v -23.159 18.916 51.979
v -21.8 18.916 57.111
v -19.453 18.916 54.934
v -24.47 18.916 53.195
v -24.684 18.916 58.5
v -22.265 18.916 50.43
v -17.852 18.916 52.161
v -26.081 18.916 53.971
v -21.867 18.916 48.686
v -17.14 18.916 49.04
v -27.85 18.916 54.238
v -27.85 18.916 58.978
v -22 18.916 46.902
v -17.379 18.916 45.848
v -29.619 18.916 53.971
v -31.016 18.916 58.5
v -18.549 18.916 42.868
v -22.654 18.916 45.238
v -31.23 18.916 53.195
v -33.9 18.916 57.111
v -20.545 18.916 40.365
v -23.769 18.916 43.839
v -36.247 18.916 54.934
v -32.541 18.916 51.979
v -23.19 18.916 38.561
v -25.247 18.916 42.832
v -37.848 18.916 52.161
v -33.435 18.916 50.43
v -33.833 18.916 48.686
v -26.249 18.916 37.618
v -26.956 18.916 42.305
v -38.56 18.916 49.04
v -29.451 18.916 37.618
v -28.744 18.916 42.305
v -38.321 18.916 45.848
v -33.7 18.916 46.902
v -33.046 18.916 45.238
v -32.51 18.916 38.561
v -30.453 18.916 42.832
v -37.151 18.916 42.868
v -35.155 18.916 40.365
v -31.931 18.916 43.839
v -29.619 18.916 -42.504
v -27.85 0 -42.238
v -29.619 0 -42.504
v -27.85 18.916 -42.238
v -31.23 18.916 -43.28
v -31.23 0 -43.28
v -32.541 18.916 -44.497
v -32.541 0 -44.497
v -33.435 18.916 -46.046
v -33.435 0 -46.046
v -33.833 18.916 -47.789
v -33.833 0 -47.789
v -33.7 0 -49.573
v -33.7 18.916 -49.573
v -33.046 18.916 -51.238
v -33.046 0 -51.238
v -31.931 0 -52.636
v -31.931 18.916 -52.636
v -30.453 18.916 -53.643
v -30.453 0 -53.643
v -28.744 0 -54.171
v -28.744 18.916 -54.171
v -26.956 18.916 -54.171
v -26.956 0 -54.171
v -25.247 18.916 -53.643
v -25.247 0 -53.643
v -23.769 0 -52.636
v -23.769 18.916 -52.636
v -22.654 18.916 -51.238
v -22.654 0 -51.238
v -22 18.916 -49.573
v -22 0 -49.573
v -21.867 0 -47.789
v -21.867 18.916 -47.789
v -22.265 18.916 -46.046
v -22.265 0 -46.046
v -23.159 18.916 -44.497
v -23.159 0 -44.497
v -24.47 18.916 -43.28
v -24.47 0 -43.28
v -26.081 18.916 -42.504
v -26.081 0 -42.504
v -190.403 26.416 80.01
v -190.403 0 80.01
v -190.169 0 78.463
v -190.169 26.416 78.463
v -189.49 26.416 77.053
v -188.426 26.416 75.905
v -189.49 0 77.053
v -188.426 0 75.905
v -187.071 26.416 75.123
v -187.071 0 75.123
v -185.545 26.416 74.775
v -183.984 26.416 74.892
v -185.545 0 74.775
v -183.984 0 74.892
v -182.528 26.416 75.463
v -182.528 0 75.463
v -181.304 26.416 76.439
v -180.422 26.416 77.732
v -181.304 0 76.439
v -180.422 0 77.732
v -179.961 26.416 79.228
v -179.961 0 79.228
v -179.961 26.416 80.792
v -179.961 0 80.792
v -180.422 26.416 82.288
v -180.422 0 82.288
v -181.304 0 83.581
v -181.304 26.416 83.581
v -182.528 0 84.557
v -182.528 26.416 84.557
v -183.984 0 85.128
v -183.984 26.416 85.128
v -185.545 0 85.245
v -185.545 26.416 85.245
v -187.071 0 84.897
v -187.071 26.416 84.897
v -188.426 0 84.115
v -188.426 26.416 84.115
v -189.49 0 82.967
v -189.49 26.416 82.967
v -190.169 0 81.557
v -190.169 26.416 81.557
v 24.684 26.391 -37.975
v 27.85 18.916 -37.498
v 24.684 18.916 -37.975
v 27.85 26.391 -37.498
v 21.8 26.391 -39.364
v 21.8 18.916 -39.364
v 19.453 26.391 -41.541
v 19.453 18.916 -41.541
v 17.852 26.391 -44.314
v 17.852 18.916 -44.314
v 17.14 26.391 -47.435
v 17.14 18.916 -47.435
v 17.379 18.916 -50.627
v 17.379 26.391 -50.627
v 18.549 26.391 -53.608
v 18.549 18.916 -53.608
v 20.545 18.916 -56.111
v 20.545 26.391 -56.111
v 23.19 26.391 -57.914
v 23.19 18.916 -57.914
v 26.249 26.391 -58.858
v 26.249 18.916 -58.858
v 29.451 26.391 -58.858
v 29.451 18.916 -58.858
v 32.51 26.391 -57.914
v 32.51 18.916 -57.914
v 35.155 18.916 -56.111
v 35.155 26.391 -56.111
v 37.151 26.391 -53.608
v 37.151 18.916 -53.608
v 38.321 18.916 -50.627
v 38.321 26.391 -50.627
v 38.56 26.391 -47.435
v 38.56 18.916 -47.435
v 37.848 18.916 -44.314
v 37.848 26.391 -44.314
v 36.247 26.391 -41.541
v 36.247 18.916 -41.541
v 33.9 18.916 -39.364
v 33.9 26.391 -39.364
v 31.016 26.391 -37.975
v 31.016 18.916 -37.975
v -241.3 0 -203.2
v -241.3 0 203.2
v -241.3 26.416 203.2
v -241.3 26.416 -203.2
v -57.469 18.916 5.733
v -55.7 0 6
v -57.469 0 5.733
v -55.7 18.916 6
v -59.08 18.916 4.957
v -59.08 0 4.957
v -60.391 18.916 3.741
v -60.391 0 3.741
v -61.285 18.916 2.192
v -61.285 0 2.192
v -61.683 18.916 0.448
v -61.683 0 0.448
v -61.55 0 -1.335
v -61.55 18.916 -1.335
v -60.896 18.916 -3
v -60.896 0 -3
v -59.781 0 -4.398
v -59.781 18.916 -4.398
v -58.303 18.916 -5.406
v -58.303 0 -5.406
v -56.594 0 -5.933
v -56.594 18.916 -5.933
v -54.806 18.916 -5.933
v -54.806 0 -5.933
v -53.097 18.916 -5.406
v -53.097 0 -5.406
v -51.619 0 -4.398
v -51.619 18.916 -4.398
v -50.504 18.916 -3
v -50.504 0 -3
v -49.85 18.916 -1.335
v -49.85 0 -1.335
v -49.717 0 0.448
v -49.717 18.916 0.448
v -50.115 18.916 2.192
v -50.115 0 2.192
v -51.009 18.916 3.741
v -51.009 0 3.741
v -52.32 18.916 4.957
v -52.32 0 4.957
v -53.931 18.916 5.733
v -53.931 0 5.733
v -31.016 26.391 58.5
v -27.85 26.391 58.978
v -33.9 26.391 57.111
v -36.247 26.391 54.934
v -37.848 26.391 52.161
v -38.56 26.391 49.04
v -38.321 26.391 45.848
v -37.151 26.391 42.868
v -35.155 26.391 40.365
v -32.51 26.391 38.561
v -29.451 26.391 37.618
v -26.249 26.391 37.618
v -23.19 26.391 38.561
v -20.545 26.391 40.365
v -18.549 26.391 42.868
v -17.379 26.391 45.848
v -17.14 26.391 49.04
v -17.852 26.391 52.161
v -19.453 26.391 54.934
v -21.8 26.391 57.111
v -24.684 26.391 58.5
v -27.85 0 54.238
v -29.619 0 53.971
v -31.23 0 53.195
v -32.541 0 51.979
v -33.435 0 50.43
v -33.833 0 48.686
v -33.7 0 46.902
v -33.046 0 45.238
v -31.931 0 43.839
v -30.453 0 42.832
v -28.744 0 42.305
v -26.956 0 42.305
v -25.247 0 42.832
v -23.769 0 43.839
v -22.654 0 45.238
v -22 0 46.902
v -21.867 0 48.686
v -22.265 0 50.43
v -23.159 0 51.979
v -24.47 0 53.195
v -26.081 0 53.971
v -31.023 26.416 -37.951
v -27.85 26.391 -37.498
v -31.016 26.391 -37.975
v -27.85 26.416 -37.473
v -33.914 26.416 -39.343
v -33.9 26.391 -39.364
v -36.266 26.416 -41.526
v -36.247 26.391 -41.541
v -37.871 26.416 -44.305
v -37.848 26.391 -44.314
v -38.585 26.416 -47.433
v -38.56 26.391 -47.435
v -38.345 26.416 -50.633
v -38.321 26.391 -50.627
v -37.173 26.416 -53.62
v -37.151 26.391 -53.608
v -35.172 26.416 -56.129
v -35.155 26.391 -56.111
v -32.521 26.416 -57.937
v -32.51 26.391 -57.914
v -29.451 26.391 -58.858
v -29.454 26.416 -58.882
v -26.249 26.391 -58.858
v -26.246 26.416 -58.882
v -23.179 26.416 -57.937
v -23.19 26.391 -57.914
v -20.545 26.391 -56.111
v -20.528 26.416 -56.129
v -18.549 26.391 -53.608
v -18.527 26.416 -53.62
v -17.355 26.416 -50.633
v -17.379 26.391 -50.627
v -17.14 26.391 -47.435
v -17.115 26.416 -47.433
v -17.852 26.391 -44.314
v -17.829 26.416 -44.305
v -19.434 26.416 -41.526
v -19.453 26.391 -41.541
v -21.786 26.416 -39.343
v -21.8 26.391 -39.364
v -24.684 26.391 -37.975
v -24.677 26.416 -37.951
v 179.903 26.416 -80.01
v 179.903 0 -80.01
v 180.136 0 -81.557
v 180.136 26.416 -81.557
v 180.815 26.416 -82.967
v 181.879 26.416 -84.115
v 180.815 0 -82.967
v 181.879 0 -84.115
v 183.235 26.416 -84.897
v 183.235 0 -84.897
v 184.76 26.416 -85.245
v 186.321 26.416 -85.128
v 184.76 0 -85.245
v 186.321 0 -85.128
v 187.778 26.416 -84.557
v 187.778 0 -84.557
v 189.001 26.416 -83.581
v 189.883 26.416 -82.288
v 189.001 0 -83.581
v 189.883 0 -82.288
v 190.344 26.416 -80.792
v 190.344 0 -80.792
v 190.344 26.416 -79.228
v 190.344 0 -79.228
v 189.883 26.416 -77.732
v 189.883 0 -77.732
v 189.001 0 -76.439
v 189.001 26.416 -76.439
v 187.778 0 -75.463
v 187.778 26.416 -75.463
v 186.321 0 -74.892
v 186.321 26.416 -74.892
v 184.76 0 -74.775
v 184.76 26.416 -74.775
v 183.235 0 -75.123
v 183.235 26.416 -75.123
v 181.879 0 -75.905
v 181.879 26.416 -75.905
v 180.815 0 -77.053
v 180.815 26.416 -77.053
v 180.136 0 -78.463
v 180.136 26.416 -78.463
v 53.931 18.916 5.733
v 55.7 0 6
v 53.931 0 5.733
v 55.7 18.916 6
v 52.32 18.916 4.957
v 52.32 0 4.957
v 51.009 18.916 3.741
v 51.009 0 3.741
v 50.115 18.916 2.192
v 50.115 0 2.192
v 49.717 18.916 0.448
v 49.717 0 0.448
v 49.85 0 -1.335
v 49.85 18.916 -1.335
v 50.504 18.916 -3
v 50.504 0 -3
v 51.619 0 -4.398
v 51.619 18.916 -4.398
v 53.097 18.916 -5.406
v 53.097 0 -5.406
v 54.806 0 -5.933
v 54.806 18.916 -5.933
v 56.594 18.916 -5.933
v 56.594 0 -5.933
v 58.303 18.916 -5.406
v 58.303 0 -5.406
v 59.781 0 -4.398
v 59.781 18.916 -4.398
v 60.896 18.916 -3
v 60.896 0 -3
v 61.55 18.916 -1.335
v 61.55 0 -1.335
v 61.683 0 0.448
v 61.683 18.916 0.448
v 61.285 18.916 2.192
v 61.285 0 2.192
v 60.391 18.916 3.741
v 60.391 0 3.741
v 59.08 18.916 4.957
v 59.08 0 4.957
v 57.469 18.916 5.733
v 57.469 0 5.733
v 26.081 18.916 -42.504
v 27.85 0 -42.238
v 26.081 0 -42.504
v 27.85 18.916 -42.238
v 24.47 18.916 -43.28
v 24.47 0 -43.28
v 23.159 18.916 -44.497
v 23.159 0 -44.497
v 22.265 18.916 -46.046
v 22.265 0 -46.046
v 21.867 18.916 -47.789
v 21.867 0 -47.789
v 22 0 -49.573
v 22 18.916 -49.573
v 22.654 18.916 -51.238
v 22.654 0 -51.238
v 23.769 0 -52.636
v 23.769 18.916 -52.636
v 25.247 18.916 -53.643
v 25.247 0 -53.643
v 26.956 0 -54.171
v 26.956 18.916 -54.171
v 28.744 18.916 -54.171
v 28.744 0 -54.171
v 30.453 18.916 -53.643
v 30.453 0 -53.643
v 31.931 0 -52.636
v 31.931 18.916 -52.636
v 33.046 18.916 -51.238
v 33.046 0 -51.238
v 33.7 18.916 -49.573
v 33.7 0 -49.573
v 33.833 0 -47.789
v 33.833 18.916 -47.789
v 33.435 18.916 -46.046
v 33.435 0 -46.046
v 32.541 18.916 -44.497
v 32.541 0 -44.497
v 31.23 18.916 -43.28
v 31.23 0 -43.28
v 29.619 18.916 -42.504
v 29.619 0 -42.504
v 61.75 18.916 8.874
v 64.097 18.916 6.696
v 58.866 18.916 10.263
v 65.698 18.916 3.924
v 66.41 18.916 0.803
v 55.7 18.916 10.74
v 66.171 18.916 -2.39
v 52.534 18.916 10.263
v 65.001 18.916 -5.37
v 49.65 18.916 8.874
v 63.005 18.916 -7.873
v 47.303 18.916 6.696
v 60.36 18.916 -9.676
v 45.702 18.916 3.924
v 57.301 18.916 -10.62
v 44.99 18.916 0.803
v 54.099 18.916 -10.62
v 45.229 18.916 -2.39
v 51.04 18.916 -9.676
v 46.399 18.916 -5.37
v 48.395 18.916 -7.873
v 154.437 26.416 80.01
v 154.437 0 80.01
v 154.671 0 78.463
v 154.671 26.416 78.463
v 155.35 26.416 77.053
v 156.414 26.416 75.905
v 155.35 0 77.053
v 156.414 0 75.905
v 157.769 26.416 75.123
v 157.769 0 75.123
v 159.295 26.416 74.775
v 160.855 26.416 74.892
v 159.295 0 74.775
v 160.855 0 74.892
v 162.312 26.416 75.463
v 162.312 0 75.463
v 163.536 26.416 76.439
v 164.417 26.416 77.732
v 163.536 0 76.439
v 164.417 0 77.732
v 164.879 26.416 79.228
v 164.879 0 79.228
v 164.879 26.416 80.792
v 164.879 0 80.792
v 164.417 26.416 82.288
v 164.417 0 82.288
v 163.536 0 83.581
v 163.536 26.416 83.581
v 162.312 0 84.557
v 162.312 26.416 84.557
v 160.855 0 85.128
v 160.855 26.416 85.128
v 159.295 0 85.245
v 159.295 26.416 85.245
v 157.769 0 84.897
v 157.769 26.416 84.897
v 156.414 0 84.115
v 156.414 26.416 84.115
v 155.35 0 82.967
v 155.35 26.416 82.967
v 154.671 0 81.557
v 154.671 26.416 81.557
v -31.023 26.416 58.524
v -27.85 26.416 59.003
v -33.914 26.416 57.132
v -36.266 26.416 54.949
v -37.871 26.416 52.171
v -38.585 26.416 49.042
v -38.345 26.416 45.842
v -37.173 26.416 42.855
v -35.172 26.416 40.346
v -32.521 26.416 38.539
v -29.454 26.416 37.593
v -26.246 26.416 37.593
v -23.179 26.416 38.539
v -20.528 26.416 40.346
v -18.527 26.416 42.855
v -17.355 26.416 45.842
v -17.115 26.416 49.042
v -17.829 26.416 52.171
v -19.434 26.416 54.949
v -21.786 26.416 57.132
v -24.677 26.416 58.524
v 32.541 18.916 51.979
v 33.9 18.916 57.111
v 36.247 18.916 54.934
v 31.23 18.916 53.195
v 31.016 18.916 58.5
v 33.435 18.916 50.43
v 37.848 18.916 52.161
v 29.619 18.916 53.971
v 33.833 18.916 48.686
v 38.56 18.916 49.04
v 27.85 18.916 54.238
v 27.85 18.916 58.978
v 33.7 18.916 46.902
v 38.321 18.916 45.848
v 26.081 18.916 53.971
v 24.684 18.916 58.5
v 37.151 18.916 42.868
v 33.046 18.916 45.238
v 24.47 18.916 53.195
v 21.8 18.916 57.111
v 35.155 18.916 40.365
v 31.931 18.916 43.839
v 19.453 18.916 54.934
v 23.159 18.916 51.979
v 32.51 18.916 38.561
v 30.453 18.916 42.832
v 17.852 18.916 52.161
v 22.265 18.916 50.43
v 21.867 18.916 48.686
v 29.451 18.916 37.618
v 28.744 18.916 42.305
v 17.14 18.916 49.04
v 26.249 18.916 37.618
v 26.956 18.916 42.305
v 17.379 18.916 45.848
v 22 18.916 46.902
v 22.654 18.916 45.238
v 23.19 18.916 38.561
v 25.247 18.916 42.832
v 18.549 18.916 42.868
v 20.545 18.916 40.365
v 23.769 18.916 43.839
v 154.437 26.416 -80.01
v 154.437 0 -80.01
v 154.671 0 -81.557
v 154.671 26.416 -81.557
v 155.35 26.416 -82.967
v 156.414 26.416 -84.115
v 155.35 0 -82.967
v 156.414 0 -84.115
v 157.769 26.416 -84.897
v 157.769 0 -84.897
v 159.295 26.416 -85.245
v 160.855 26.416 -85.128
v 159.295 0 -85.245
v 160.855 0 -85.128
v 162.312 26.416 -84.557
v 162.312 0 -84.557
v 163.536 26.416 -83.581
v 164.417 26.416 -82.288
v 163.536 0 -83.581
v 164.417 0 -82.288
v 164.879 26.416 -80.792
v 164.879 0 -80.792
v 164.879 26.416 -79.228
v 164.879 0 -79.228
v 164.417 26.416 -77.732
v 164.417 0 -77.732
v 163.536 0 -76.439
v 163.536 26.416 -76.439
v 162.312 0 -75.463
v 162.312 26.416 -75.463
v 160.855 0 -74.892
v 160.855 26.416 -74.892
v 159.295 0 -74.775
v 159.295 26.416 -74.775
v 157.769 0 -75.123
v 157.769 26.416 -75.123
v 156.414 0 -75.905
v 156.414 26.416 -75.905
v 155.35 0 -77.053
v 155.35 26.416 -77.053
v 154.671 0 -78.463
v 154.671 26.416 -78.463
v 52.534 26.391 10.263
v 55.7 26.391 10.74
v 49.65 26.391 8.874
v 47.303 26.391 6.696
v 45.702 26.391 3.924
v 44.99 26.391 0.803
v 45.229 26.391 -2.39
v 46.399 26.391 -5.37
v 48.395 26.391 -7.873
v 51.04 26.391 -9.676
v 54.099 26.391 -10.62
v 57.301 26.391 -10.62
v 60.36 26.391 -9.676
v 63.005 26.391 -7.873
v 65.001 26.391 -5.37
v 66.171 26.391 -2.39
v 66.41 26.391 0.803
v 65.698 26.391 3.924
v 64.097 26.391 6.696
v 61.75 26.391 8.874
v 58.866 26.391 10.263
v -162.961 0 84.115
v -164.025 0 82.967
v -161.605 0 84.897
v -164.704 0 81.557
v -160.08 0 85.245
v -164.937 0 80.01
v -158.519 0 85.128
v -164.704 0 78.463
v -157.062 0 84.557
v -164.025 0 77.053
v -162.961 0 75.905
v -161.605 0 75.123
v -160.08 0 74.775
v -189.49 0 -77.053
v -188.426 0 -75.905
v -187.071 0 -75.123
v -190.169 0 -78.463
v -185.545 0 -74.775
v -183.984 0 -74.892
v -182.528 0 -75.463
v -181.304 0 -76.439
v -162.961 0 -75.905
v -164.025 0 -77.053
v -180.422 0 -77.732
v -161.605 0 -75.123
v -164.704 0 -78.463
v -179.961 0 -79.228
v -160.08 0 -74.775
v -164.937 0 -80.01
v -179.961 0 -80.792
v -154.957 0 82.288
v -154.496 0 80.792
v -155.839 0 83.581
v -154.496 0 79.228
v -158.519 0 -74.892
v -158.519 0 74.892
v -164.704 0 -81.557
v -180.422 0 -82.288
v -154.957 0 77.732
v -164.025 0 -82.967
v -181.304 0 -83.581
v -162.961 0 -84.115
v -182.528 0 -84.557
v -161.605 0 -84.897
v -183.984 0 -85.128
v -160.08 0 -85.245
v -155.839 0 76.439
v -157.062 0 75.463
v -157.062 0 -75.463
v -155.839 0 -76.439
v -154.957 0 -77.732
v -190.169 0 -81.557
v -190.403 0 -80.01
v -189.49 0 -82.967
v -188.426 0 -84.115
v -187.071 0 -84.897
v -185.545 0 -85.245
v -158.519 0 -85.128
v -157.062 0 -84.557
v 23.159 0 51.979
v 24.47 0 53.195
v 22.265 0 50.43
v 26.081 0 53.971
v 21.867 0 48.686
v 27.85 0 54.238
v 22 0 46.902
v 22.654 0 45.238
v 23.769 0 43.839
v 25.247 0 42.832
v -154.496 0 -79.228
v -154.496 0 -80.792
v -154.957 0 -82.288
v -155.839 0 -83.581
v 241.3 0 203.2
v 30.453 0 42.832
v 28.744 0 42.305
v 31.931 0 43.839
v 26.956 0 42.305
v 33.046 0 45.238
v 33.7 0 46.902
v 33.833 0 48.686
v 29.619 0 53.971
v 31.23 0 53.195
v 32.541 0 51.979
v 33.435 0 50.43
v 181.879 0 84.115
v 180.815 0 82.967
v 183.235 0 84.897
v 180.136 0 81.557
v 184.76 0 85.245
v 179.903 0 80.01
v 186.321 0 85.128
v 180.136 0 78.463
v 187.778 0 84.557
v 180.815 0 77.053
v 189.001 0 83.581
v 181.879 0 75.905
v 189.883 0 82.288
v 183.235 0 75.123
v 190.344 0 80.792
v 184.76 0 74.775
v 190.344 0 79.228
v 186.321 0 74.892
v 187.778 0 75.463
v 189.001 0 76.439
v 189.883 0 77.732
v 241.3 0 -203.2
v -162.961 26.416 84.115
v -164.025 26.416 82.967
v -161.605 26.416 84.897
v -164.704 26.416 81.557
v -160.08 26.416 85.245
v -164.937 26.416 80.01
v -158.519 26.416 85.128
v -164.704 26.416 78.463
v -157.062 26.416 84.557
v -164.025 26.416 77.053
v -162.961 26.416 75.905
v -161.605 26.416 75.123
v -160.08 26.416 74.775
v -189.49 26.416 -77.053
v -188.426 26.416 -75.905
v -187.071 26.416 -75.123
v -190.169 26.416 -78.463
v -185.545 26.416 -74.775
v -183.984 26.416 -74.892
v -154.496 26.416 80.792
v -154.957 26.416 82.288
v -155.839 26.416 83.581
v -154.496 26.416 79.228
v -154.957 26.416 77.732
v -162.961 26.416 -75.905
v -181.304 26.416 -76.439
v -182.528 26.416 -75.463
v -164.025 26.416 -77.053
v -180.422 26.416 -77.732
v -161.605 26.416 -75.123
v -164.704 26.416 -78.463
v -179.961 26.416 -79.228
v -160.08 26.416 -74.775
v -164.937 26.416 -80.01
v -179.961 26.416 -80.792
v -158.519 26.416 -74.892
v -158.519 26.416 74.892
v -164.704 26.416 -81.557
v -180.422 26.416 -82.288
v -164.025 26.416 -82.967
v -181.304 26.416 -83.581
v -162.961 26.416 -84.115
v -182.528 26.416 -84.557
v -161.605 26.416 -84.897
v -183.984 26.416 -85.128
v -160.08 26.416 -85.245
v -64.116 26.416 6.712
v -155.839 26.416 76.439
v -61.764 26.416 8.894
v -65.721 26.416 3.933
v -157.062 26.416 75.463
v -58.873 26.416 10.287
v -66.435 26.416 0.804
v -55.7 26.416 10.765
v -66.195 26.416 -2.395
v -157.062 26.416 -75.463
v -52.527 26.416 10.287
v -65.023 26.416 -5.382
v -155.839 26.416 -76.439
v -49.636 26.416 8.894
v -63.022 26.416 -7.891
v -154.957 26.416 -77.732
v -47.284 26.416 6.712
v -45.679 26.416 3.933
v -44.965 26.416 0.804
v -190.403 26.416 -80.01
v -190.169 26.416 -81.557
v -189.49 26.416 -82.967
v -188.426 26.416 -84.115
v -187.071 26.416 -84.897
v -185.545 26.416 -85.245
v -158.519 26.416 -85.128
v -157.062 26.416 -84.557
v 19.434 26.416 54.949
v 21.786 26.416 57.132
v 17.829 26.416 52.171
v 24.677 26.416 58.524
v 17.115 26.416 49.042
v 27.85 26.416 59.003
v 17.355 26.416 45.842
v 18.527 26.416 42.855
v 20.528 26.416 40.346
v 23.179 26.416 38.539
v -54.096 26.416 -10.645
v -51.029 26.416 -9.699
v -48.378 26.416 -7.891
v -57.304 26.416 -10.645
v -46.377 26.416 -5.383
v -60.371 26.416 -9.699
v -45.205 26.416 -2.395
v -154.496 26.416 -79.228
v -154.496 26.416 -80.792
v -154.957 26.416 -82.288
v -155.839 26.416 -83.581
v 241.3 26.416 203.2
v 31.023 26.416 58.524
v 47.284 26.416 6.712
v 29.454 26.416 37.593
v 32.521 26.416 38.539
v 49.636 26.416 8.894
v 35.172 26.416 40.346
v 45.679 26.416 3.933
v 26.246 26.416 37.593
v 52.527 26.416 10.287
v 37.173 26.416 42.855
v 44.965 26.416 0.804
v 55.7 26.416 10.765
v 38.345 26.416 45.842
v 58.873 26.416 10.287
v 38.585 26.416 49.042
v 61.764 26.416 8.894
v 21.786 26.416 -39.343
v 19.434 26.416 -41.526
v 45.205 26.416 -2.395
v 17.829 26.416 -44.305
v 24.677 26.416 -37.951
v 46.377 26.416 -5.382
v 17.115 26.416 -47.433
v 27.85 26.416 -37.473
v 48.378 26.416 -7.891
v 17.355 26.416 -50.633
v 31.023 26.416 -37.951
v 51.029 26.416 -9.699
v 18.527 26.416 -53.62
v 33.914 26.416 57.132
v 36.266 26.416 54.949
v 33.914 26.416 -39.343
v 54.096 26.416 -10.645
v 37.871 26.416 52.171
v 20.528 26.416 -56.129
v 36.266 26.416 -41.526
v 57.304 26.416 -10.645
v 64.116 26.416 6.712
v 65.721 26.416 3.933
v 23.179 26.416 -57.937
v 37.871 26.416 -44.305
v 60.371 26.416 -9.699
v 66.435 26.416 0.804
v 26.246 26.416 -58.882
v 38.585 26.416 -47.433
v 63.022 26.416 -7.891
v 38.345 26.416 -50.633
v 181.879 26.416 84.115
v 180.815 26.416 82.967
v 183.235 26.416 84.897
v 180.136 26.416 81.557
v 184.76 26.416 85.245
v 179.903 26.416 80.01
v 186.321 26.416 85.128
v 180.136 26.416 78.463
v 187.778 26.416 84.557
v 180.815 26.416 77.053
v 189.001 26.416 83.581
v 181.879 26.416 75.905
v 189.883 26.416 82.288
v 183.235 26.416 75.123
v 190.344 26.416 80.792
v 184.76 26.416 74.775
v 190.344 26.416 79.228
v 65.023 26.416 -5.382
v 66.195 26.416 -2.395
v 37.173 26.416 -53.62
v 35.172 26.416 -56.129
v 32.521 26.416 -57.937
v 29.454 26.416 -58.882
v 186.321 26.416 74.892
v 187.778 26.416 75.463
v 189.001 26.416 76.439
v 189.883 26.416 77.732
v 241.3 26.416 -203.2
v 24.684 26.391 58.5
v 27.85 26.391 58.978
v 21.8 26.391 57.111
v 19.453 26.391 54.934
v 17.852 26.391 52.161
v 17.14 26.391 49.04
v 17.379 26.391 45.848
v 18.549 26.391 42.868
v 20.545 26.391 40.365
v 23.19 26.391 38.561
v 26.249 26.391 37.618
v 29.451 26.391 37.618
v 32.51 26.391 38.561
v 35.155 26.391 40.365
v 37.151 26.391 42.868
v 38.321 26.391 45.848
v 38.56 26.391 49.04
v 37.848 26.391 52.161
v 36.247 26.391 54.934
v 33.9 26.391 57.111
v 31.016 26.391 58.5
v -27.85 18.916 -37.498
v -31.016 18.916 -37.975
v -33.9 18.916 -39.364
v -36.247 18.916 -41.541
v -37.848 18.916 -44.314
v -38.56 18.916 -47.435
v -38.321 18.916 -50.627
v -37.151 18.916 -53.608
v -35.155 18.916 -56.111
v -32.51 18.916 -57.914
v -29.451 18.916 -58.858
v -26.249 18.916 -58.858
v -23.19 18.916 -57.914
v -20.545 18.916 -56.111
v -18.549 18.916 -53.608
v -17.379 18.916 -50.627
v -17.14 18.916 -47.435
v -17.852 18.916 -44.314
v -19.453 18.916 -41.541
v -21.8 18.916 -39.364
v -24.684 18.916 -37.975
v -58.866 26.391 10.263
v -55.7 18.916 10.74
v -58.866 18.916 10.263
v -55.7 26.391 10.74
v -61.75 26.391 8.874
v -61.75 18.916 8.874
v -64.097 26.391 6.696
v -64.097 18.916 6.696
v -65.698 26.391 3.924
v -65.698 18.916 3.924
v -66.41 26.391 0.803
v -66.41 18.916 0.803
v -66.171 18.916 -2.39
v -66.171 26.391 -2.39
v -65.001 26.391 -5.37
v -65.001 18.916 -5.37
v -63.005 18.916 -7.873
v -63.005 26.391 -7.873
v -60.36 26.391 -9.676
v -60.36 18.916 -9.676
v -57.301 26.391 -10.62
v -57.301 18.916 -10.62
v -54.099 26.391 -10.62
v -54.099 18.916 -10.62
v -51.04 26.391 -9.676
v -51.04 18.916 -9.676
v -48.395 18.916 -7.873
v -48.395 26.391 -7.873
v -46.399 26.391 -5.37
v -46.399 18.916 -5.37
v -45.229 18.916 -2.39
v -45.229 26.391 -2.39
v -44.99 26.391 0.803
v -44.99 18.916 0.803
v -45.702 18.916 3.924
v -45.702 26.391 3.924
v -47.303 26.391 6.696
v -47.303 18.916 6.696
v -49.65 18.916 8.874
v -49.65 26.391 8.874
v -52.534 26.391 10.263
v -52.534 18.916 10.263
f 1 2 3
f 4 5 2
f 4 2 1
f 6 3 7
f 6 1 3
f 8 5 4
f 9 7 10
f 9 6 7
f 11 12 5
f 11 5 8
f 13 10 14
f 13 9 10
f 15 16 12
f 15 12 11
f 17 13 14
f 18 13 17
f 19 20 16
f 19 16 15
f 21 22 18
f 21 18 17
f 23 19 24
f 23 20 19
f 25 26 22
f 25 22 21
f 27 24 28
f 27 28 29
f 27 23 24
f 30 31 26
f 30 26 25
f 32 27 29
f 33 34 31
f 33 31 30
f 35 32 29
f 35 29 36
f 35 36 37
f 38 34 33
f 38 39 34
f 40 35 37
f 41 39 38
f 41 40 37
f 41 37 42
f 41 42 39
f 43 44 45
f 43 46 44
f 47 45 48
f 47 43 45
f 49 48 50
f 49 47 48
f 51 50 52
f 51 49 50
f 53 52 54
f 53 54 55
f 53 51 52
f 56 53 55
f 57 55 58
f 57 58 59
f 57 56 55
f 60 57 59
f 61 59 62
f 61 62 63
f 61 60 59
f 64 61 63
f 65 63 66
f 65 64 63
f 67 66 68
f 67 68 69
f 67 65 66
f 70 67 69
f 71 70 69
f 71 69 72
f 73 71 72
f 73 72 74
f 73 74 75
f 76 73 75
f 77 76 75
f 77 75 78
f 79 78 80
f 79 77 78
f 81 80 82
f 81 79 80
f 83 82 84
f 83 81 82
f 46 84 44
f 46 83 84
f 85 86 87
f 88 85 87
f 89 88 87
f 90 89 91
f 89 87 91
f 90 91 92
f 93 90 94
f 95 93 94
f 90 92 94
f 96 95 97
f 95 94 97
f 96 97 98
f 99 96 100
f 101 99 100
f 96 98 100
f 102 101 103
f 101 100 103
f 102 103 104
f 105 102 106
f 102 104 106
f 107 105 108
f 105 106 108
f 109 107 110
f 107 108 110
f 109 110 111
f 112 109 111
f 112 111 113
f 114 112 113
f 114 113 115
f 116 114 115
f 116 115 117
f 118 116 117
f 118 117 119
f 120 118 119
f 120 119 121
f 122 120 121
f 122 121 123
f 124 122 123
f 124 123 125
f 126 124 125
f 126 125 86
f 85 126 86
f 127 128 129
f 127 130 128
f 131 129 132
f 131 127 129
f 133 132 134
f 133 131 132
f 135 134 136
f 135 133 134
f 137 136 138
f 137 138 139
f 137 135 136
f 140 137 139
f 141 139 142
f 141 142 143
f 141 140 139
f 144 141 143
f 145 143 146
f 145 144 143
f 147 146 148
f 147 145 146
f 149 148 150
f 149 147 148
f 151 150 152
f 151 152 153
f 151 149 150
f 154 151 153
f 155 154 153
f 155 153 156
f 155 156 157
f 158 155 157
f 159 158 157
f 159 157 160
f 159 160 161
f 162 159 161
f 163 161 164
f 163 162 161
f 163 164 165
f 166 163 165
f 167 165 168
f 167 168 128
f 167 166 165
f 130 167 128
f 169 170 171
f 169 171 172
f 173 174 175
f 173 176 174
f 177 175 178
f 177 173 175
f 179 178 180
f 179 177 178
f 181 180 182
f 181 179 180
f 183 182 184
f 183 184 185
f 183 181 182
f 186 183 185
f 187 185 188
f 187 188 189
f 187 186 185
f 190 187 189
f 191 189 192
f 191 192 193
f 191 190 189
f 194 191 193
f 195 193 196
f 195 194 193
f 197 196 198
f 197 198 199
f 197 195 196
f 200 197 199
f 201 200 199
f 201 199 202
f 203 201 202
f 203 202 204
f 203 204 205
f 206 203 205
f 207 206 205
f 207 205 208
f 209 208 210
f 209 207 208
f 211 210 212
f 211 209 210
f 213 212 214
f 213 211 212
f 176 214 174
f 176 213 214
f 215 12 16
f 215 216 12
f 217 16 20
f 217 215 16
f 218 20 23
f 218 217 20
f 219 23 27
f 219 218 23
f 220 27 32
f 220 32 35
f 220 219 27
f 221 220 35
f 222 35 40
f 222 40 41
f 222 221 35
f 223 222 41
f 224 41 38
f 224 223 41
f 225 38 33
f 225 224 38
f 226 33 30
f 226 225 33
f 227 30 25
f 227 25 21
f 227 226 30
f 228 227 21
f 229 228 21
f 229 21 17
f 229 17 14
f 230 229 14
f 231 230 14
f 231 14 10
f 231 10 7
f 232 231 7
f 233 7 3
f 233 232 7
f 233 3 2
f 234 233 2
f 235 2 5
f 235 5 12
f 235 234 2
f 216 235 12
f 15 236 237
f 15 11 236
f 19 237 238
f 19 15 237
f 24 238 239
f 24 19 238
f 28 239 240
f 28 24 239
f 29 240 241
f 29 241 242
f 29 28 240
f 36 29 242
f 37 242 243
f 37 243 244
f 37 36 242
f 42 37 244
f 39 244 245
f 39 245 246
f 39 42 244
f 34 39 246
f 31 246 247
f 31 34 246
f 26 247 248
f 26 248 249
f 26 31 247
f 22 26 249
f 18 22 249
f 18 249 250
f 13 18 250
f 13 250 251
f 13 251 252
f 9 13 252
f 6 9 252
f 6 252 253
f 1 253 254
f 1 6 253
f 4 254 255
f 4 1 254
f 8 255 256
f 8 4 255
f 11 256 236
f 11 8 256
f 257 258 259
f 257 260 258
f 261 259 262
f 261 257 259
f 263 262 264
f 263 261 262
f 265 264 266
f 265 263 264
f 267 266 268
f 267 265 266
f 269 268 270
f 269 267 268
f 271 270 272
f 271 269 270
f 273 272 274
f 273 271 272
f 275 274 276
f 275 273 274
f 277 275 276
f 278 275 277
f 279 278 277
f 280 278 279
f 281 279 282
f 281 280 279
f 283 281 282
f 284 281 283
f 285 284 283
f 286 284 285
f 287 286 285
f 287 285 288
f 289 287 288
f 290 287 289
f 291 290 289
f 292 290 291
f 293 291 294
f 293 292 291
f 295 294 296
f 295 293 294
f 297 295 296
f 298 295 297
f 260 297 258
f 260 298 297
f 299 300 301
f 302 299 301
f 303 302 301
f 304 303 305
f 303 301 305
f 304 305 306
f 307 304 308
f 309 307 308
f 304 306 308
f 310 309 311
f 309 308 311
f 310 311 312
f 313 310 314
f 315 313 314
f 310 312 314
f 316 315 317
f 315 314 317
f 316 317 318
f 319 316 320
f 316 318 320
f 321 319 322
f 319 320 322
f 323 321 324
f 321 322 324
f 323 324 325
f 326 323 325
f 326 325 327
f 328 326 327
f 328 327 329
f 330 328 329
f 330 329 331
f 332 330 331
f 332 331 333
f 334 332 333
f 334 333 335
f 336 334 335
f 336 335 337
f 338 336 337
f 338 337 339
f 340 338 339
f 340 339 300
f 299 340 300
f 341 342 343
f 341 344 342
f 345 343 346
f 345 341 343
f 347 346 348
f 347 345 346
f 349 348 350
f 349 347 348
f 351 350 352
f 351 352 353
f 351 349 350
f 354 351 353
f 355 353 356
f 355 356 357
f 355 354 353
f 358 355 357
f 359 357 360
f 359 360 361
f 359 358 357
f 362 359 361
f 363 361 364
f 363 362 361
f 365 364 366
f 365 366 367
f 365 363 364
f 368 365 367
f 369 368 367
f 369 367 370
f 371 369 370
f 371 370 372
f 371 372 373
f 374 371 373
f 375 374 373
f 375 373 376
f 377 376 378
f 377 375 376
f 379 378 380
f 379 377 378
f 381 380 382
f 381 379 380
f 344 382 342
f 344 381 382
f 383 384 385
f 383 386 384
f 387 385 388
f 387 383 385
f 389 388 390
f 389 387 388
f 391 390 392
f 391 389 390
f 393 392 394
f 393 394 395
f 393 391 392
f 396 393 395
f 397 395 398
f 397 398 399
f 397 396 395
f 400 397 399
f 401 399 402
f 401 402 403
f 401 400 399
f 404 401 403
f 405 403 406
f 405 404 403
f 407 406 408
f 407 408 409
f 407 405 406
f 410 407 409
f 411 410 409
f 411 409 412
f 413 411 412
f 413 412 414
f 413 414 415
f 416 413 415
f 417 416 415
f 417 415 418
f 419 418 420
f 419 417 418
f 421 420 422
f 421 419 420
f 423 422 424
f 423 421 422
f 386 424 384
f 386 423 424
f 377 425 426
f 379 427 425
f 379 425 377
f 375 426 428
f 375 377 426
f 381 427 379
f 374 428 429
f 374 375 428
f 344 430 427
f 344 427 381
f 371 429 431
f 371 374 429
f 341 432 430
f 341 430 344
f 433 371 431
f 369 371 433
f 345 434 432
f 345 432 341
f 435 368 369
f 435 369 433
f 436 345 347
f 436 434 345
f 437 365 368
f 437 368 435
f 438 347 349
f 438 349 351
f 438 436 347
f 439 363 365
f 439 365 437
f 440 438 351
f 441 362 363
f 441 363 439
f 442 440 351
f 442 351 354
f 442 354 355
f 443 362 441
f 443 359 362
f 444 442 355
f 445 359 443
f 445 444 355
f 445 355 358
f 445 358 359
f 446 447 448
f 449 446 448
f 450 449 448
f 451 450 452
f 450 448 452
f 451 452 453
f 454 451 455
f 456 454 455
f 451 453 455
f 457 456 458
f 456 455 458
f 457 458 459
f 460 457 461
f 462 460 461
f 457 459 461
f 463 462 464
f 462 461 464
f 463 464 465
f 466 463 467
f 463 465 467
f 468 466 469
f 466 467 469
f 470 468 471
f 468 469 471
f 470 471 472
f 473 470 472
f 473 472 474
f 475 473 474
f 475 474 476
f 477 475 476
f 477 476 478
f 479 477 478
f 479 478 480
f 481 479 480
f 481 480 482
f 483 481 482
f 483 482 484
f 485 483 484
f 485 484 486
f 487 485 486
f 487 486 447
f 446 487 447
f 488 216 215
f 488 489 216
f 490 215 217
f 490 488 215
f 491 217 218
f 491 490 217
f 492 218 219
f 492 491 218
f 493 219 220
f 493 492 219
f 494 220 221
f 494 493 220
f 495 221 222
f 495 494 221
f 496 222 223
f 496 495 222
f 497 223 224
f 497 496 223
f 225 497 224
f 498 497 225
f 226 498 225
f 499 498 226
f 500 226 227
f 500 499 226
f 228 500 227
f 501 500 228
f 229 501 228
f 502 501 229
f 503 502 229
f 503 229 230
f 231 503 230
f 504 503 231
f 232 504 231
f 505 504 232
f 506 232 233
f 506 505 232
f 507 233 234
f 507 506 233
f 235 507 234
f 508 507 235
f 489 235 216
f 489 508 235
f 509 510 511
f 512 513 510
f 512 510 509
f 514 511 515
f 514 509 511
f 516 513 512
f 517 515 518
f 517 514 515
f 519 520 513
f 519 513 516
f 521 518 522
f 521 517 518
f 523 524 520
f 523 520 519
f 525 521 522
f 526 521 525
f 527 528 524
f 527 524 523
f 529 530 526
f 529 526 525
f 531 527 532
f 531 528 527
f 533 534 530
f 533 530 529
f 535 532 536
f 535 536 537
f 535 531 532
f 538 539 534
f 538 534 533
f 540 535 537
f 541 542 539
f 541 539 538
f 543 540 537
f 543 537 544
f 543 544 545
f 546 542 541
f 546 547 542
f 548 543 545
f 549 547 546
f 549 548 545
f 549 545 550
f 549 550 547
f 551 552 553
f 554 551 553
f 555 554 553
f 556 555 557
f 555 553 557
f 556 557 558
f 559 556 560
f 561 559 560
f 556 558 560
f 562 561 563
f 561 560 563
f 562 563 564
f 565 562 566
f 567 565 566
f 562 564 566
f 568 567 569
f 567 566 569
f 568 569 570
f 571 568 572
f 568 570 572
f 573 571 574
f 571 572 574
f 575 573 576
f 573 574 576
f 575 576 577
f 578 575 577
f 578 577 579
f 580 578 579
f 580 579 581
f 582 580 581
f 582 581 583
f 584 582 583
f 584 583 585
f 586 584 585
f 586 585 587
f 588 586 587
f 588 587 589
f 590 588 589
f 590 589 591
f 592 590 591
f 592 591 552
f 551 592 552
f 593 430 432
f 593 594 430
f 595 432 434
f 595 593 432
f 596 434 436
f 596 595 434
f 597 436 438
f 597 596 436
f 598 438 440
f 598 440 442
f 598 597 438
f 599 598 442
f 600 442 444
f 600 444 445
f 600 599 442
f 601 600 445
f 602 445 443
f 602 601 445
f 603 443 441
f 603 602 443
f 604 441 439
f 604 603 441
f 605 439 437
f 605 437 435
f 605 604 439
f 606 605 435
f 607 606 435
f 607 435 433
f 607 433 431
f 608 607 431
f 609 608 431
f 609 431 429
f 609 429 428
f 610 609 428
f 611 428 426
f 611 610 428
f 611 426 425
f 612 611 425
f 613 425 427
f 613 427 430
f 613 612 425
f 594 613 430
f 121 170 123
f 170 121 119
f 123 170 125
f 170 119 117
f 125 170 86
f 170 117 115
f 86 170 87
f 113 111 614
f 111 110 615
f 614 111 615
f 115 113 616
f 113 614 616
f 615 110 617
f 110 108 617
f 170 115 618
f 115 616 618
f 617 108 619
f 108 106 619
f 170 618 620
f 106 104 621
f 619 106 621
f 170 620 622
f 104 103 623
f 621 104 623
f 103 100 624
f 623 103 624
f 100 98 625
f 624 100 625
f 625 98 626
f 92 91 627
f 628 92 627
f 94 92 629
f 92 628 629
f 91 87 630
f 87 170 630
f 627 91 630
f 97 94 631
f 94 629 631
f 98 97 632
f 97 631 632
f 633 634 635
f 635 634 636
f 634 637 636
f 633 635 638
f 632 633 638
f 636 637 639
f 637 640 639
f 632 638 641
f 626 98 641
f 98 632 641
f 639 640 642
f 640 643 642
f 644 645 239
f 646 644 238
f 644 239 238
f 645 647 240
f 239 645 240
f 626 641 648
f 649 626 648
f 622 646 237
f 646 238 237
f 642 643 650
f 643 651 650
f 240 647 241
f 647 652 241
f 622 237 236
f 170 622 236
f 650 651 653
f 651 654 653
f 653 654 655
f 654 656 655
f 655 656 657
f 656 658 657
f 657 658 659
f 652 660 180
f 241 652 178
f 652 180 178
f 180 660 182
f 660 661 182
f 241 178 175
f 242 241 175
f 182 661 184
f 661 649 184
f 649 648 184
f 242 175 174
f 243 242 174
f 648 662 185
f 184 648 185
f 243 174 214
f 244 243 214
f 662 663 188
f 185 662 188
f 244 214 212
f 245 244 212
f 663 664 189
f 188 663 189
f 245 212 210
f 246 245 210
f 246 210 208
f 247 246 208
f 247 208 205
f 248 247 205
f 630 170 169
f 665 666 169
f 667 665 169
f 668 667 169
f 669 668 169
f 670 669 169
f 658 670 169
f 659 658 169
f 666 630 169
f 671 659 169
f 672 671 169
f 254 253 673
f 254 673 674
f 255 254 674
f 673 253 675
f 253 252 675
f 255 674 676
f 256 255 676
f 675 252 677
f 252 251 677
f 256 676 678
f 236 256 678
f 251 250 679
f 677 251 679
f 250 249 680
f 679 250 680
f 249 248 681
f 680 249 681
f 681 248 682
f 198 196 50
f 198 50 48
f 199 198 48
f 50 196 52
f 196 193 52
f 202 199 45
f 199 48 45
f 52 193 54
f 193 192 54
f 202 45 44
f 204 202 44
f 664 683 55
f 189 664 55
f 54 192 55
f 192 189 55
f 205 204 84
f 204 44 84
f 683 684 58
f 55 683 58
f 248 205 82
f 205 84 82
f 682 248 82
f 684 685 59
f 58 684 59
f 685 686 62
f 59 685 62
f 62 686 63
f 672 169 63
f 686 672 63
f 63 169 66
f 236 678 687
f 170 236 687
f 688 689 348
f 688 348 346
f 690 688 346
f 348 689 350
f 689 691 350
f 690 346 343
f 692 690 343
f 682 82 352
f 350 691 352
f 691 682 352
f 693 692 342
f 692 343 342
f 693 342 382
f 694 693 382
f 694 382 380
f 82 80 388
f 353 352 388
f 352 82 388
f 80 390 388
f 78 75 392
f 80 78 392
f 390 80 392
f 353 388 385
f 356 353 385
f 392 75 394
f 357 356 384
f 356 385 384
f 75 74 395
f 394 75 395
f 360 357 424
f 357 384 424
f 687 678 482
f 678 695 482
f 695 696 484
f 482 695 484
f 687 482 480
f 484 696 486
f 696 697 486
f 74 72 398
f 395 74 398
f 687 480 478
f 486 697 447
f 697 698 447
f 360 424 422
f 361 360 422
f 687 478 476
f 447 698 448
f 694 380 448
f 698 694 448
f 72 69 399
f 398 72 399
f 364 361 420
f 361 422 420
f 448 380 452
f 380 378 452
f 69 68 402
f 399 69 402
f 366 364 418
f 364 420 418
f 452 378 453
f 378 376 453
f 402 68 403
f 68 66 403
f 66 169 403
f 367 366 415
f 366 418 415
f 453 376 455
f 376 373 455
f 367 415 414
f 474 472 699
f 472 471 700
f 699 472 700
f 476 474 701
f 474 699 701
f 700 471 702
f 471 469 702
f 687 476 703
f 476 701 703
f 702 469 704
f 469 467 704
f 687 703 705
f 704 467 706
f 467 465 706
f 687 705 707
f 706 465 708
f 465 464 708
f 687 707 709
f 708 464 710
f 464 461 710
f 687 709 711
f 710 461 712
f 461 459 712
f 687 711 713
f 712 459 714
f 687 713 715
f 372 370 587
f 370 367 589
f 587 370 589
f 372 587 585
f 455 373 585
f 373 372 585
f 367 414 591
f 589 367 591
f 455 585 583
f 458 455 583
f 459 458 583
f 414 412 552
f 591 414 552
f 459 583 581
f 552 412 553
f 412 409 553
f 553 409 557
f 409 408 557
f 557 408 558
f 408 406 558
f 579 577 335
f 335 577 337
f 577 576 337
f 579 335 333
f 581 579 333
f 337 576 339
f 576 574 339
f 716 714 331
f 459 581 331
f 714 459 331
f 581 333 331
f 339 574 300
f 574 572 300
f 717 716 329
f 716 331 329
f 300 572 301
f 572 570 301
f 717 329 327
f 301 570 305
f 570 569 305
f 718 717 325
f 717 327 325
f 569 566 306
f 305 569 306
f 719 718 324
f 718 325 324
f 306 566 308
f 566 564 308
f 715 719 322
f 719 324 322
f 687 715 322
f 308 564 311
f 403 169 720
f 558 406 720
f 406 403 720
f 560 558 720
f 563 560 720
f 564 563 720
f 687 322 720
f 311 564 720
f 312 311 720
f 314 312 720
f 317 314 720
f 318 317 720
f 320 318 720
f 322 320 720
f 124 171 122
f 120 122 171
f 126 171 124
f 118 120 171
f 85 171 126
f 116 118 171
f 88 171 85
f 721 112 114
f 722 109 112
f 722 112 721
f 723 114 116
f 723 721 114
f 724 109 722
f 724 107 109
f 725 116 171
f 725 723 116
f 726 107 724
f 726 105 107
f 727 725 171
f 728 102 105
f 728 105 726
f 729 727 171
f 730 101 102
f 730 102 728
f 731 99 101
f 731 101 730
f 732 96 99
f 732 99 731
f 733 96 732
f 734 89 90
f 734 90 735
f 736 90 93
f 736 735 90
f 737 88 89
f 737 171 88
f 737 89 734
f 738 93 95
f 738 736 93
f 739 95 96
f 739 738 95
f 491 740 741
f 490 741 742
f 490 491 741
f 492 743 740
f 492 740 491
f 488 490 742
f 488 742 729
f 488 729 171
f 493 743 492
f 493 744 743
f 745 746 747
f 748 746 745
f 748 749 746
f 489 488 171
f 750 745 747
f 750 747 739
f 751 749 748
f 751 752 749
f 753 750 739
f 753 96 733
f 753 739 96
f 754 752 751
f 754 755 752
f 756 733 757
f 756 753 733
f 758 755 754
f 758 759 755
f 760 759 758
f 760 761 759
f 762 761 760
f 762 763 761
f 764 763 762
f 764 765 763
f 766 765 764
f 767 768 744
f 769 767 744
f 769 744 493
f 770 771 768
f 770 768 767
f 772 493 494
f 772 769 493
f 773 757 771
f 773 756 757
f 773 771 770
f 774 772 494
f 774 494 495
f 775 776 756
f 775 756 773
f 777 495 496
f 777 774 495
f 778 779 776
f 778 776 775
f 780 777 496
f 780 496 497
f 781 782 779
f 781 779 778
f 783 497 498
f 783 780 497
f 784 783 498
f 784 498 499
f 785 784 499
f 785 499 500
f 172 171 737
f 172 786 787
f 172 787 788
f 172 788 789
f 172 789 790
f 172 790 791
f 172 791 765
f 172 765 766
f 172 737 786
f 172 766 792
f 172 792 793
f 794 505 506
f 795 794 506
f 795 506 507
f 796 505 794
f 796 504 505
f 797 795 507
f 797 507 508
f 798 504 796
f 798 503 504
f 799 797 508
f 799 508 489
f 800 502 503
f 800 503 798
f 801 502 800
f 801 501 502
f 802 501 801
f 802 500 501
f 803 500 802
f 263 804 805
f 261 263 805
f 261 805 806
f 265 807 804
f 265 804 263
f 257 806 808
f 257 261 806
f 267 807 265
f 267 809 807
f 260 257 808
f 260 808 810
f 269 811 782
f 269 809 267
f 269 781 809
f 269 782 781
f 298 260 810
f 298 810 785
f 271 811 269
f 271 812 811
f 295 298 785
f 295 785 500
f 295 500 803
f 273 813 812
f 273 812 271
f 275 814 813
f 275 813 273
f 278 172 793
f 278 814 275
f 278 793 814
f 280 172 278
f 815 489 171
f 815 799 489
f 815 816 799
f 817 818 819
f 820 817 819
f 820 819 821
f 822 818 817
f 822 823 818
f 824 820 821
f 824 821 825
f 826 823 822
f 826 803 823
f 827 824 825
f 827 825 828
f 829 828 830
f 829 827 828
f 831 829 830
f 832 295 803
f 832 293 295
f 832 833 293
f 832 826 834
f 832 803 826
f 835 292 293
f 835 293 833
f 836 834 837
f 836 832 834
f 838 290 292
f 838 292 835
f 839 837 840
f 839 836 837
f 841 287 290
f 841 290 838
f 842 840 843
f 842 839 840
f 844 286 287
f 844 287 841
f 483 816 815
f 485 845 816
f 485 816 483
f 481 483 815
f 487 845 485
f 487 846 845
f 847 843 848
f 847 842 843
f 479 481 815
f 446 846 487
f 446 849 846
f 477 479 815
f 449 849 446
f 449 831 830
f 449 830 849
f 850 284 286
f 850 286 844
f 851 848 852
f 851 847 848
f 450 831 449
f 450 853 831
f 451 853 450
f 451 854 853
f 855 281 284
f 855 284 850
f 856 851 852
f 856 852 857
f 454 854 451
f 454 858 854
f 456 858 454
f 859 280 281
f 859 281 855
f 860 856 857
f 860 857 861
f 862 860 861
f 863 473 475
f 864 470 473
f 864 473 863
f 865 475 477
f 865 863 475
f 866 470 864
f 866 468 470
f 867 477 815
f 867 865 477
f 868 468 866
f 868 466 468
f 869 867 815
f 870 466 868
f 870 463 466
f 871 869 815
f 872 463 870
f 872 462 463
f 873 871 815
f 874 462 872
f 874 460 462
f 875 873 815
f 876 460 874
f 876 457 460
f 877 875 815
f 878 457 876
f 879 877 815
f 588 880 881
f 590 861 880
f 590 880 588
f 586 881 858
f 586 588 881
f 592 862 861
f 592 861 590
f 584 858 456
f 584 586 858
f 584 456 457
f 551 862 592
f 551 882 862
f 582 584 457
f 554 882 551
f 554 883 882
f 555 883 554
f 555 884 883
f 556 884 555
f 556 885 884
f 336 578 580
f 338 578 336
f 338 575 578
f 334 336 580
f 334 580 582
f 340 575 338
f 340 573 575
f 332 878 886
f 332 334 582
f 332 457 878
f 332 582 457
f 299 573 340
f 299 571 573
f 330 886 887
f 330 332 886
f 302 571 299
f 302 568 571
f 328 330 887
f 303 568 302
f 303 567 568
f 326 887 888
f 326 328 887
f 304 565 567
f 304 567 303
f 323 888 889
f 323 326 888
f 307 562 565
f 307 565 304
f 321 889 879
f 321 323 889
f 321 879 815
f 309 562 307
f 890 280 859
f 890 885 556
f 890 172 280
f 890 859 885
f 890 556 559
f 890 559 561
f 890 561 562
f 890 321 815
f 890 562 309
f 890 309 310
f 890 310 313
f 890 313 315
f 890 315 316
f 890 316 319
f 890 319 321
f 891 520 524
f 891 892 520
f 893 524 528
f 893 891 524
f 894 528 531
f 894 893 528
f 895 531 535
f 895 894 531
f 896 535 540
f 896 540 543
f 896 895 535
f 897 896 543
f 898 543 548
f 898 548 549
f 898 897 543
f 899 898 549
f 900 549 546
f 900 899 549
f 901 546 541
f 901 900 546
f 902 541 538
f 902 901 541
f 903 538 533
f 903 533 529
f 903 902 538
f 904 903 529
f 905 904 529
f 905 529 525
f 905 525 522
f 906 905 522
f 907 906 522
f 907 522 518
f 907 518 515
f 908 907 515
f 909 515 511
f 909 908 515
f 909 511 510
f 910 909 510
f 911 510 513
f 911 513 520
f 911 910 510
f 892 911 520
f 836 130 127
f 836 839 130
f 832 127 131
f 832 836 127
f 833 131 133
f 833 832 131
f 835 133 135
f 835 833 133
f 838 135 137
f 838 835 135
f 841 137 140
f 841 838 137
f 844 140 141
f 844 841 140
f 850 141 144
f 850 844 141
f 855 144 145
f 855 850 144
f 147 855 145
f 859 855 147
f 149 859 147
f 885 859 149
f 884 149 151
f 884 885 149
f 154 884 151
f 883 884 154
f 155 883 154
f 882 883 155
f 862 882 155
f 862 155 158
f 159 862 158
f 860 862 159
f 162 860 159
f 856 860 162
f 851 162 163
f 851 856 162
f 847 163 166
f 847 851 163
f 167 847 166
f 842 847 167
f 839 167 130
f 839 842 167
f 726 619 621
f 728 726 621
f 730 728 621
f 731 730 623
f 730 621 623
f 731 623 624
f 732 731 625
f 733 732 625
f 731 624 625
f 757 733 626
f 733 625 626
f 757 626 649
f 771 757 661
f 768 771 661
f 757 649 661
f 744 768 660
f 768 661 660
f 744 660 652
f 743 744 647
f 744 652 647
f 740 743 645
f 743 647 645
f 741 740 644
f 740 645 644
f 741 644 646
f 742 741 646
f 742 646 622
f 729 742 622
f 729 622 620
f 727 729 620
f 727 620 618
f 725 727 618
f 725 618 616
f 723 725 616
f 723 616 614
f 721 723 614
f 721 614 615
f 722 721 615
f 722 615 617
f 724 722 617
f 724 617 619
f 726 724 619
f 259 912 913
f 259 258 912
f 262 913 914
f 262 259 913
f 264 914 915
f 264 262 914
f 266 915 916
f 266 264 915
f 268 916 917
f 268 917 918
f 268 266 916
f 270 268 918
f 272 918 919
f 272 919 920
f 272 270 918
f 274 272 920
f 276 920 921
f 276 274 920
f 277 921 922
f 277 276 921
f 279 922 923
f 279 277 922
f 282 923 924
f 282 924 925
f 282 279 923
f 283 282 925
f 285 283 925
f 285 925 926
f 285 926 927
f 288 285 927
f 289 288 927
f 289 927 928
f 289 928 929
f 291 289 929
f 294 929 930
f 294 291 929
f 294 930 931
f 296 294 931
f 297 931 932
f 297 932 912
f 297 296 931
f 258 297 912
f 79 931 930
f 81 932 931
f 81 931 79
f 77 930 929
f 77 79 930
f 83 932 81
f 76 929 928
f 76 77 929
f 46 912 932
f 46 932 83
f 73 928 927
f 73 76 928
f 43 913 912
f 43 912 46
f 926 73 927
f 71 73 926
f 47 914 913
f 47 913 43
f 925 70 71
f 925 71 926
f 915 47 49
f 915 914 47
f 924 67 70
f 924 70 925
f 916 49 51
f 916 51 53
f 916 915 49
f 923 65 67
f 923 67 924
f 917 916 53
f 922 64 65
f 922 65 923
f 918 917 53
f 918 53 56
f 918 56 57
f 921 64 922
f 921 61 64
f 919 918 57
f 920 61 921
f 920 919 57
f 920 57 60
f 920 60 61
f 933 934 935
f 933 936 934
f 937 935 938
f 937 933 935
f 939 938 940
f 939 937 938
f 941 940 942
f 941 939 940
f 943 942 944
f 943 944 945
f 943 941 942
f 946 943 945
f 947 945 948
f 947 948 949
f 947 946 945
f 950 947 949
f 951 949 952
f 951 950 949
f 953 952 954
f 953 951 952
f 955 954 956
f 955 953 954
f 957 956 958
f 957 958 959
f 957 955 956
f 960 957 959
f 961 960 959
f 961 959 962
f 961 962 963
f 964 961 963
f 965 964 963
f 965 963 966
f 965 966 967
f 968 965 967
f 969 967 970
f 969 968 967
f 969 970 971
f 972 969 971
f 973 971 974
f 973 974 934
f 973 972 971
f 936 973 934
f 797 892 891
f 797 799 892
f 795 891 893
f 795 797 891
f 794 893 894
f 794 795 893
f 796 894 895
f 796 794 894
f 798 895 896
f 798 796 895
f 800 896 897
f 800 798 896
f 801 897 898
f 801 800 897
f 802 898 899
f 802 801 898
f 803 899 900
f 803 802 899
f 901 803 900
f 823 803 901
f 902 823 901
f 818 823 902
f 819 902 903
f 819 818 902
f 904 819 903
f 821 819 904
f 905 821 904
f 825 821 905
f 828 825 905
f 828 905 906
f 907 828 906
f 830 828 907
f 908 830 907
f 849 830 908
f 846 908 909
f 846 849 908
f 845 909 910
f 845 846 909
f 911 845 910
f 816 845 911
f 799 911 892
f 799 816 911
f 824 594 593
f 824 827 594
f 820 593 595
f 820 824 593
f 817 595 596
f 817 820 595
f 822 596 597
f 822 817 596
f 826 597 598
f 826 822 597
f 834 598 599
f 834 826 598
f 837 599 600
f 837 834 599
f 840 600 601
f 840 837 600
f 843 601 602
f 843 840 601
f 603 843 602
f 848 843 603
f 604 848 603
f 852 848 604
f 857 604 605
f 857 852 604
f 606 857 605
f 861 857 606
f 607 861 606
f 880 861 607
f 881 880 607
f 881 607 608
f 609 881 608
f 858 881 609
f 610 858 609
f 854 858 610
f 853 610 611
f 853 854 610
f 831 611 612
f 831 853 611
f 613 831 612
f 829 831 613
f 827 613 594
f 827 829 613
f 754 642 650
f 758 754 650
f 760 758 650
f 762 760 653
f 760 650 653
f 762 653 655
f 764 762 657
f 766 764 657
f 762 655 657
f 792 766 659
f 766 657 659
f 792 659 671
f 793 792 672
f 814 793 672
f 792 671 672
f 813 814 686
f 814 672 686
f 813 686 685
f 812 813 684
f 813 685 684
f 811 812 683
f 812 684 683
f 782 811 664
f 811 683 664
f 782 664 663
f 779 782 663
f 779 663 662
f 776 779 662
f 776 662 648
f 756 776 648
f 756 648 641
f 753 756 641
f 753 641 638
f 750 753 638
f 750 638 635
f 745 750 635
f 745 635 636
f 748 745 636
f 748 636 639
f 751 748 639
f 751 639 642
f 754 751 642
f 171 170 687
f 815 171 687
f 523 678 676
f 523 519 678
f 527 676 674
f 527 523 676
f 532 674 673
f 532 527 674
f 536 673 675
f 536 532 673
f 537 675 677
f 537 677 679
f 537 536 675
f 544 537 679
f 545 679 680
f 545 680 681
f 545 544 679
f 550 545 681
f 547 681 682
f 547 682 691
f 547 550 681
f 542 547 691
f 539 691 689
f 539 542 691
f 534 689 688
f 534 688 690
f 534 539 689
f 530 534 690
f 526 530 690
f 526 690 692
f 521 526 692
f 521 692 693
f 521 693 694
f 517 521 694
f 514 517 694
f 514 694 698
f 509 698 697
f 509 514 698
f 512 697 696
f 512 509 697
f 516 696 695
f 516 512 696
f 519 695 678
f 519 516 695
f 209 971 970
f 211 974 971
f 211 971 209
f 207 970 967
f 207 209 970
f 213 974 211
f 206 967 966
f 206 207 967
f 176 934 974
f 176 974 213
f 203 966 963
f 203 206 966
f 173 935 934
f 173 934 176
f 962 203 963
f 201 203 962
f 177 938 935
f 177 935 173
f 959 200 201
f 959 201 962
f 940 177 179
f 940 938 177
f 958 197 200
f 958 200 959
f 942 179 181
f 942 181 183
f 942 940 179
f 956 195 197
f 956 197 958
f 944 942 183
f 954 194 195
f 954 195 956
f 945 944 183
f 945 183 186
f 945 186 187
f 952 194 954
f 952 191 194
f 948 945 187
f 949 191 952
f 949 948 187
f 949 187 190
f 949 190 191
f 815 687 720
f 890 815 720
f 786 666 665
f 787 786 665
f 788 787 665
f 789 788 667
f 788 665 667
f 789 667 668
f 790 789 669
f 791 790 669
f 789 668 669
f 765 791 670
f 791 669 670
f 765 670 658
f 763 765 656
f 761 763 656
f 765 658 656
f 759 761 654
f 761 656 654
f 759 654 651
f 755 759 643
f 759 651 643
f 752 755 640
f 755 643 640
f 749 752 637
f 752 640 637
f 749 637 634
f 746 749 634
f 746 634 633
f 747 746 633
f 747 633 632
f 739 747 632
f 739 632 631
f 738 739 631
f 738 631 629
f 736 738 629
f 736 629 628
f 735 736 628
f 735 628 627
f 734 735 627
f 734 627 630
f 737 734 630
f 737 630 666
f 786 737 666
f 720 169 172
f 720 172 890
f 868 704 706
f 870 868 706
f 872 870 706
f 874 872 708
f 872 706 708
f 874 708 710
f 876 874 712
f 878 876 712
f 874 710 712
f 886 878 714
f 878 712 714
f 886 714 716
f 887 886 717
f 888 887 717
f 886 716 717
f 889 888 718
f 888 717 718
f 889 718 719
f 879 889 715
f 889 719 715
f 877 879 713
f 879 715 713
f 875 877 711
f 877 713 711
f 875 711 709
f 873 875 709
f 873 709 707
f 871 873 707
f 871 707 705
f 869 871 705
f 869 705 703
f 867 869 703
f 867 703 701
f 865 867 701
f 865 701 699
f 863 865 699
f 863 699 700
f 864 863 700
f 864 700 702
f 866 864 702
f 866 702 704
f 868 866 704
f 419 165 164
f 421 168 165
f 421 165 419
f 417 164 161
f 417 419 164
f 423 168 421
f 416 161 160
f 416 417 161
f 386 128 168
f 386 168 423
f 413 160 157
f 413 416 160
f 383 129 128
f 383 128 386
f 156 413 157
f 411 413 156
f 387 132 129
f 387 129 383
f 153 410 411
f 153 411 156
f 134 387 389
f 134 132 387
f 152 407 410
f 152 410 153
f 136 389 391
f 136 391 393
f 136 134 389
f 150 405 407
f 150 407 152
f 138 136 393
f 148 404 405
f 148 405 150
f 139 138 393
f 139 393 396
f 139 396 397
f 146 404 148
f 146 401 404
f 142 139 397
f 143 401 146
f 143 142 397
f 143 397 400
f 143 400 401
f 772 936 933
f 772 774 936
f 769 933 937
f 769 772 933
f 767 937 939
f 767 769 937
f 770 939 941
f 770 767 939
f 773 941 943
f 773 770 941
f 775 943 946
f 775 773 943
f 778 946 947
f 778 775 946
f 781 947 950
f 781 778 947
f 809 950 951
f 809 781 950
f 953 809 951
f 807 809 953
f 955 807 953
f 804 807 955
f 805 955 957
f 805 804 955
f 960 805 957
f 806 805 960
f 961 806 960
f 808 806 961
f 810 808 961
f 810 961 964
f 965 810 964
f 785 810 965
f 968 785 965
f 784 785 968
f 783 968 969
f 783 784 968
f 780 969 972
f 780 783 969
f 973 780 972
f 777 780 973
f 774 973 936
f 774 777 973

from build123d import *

# Parameters (mm, degrees)
SKETCH1_W                               = 482.6
SKETCH1_H                               = 406.4
BOSS_EXTRUDE1_DEPTH                     = 26.416
SKETCH3_R                               = 1.27
SKETCH3_R_2                             = 5.25
CUT_EXTRUDE2_DEPTH                      = 27.416
CBORE_FOR_M10_HEX_HEAD_BOLT1_AT_2_COUNT = 2
CBORE_FOR_M10_HEX_HEAD_BOLT1_AT_2_PITCH = 55.7
CBORE_FOR_M10_HEX_HEAD_BOLT1_AT_3_COUNT = 2
CBORE_FOR_M10_HEX_HEAD_BOLT1_AT_3_PITCH = 96.475229982
CBORE_FOR_M10_HEX_HEAD_BOLT1_AT_4_COUNT = 2
CBORE_FOR_M10_HEX_HEAD_BOLT1_AT_4_PITCH = 111.4
CBORE_FOR_M10_HEX_HEAD_BOLT1_AT_5_COUNT = 2
CBORE_FOR_M10_HEX_HEAD_BOLT1_AT_5_PITCH = 96.475229982
CBORE_FOR_M10_HEX_HEAD_BOLT1_AT_6_COUNT = 2
CBORE_FOR_M10_HEX_HEAD_BOLT1_AT_6_PITCH = 55.7
TAP_DRILL_FOR_M10_HELICOIL1_D           = 10.5


with BuildPart() as part:
    # Sketch1 → Boss-Extrude1 (new body)
    with BuildSketch(Plane(origin=(0, 0, 0), x_dir=(1, 0, 0), z_dir=(0, 1, 0))):
        Rectangle(SKETCH1_W, SKETCH1_H)
    extrude(amount=BOSS_EXTRUDE1_DEPTH)

    # Sketch3 → Cut-Extrude2 (cut, through all)
    with BuildSketch(Plane(origin=(0, 26.416, 0), x_dir=(1, 0, 0), z_dir=(0, 1, 0))):
        with Locations((-185.152559706, -80.01)):
            Circle(SKETCH3_R)
        with Locations((-159.68726, -80.01)):
            Circle(SKETCH3_R)
        with Locations((-185.152559706, 80.01)):
            Circle(SKETCH3_R)
        with Locations((-159.68726, 80.01)):
            Circle(SKETCH3_R)
        with Locations((159.68726, -80.01)):
            Circle(SKETCH3_R)
        with Locations((185.152559706, -80.01)):
            Circle(SKETCH3_R)
        with Locations((185.152559706, 80.01)):
            Circle(SKETCH3_R)
        with Locations((159.68726, 80.01)):
            Circle(SKETCH3_R)
        with Locations((55.7, 0)):
            Circle(SKETCH3_R_2)
        with Locations((27.85, -48.237614991)):
            Circle(SKETCH3_R_2)
        with Locations((-27.85, -48.237614991)):
            Circle(SKETCH3_R_2)
        with Locations((-55.7, 0)):
            Circle(SKETCH3_R_2)
        with Locations((-27.85, 48.237614991)):
            Circle(SKETCH3_R_2)
        with Locations((27.85, 48.237614991)):
            Circle(SKETCH3_R_2)
    extrude(amount=-CUT_EXTRUDE2_DEPTH, mode=Mode.SUBTRACT)

    # Sketch11 → CBORE for M10 Hex Head Bolt1 (revolve, cut)
    with BuildSketch(Plane(origin=(27.85, 26.416, -48.237614991), x_dir=(0, 0, 1), z_dir=(1, 0, 0))):
        Polygon((0, 0), (0, 26.416), (6, 26.416), (6, 7.5), (10.74, 7.5), (10.74, 0.025), (10.765, 0), align=None)
    cbore_for_m10_hex_head_bolt1 = revolve(axis=Axis((27.85, 32.766, -48.237614991), (0, -1, 0)), mode=Mode.SUBTRACT)

    # CBORE for M10 Hex Head Bolt1 at 2: CBORE for M10 Hex Head Bolt1 ×2
    with Locations(*[Vector(0.5, 0, 0.866025404) * (i * CBORE_FOR_M10_HEX_HEAD_BOLT1_AT_2_PITCH) for i in range(1, CBORE_FOR_M10_HEX_HEAD_BOLT1_AT_2_COUNT)]):
        add(cbore_for_m10_hex_head_bolt1, mode=Mode.SUBTRACT)

    # CBORE for M10 Hex Head Bolt1 at 3: CBORE for M10 Hex Head Bolt1 ×2
    with Locations(*[(0, 0, i * CBORE_FOR_M10_HEX_HEAD_BOLT1_AT_3_PITCH) for i in range(1, CBORE_FOR_M10_HEX_HEAD_BOLT1_AT_3_COUNT)]):
        add(cbore_for_m10_hex_head_bolt1, mode=Mode.SUBTRACT)

    # CBORE for M10 Hex Head Bolt1 at 4: CBORE for M10 Hex Head Bolt1 ×2
    with Locations(*[Vector(-0.5, 0, 0.866025404) * (i * CBORE_FOR_M10_HEX_HEAD_BOLT1_AT_4_PITCH) for i in range(1, CBORE_FOR_M10_HEX_HEAD_BOLT1_AT_4_COUNT)]):
        add(cbore_for_m10_hex_head_bolt1, mode=Mode.SUBTRACT)

    # CBORE for M10 Hex Head Bolt1 at 5: CBORE for M10 Hex Head Bolt1 ×2
    with Locations(*[Vector(-0.866025404, 0, 0.5) * (i * CBORE_FOR_M10_HEX_HEAD_BOLT1_AT_5_PITCH) for i in range(1, CBORE_FOR_M10_HEX_HEAD_BOLT1_AT_5_COUNT)]):
        add(cbore_for_m10_hex_head_bolt1, mode=Mode.SUBTRACT)

    # CBORE for M10 Hex Head Bolt1 at 6: CBORE for M10 Hex Head Bolt1 ×2
    with Locations(*[(-i * CBORE_FOR_M10_HEX_HEAD_BOLT1_AT_6_PITCH, 0, 0) for i in range(1, CBORE_FOR_M10_HEX_HEAD_BOLT1_AT_6_COUNT)]):
        add(cbore_for_m10_hex_head_bolt1, mode=Mode.SUBTRACT)

    # Tap Drill for M10 Helicoil1 (through all)
    with Locations(Plane(origin=(0, 26.416, 0), x_dir=(1, 0, 0), z_dir=(0, 1, 0))):
        with Locations((-185.152559706, -80.01), (-159.68726, -80.01), (-185.152559706, 80.01), (-159.68726, 80.01), (185.152559706, 80.01), (159.68726, 80.01), (185.152559706, -80.01), (159.68726, -80.01)):
            Hole(TAP_DRILL_FOR_M10_HELICOIL1_D / 2)


solid = part.part
